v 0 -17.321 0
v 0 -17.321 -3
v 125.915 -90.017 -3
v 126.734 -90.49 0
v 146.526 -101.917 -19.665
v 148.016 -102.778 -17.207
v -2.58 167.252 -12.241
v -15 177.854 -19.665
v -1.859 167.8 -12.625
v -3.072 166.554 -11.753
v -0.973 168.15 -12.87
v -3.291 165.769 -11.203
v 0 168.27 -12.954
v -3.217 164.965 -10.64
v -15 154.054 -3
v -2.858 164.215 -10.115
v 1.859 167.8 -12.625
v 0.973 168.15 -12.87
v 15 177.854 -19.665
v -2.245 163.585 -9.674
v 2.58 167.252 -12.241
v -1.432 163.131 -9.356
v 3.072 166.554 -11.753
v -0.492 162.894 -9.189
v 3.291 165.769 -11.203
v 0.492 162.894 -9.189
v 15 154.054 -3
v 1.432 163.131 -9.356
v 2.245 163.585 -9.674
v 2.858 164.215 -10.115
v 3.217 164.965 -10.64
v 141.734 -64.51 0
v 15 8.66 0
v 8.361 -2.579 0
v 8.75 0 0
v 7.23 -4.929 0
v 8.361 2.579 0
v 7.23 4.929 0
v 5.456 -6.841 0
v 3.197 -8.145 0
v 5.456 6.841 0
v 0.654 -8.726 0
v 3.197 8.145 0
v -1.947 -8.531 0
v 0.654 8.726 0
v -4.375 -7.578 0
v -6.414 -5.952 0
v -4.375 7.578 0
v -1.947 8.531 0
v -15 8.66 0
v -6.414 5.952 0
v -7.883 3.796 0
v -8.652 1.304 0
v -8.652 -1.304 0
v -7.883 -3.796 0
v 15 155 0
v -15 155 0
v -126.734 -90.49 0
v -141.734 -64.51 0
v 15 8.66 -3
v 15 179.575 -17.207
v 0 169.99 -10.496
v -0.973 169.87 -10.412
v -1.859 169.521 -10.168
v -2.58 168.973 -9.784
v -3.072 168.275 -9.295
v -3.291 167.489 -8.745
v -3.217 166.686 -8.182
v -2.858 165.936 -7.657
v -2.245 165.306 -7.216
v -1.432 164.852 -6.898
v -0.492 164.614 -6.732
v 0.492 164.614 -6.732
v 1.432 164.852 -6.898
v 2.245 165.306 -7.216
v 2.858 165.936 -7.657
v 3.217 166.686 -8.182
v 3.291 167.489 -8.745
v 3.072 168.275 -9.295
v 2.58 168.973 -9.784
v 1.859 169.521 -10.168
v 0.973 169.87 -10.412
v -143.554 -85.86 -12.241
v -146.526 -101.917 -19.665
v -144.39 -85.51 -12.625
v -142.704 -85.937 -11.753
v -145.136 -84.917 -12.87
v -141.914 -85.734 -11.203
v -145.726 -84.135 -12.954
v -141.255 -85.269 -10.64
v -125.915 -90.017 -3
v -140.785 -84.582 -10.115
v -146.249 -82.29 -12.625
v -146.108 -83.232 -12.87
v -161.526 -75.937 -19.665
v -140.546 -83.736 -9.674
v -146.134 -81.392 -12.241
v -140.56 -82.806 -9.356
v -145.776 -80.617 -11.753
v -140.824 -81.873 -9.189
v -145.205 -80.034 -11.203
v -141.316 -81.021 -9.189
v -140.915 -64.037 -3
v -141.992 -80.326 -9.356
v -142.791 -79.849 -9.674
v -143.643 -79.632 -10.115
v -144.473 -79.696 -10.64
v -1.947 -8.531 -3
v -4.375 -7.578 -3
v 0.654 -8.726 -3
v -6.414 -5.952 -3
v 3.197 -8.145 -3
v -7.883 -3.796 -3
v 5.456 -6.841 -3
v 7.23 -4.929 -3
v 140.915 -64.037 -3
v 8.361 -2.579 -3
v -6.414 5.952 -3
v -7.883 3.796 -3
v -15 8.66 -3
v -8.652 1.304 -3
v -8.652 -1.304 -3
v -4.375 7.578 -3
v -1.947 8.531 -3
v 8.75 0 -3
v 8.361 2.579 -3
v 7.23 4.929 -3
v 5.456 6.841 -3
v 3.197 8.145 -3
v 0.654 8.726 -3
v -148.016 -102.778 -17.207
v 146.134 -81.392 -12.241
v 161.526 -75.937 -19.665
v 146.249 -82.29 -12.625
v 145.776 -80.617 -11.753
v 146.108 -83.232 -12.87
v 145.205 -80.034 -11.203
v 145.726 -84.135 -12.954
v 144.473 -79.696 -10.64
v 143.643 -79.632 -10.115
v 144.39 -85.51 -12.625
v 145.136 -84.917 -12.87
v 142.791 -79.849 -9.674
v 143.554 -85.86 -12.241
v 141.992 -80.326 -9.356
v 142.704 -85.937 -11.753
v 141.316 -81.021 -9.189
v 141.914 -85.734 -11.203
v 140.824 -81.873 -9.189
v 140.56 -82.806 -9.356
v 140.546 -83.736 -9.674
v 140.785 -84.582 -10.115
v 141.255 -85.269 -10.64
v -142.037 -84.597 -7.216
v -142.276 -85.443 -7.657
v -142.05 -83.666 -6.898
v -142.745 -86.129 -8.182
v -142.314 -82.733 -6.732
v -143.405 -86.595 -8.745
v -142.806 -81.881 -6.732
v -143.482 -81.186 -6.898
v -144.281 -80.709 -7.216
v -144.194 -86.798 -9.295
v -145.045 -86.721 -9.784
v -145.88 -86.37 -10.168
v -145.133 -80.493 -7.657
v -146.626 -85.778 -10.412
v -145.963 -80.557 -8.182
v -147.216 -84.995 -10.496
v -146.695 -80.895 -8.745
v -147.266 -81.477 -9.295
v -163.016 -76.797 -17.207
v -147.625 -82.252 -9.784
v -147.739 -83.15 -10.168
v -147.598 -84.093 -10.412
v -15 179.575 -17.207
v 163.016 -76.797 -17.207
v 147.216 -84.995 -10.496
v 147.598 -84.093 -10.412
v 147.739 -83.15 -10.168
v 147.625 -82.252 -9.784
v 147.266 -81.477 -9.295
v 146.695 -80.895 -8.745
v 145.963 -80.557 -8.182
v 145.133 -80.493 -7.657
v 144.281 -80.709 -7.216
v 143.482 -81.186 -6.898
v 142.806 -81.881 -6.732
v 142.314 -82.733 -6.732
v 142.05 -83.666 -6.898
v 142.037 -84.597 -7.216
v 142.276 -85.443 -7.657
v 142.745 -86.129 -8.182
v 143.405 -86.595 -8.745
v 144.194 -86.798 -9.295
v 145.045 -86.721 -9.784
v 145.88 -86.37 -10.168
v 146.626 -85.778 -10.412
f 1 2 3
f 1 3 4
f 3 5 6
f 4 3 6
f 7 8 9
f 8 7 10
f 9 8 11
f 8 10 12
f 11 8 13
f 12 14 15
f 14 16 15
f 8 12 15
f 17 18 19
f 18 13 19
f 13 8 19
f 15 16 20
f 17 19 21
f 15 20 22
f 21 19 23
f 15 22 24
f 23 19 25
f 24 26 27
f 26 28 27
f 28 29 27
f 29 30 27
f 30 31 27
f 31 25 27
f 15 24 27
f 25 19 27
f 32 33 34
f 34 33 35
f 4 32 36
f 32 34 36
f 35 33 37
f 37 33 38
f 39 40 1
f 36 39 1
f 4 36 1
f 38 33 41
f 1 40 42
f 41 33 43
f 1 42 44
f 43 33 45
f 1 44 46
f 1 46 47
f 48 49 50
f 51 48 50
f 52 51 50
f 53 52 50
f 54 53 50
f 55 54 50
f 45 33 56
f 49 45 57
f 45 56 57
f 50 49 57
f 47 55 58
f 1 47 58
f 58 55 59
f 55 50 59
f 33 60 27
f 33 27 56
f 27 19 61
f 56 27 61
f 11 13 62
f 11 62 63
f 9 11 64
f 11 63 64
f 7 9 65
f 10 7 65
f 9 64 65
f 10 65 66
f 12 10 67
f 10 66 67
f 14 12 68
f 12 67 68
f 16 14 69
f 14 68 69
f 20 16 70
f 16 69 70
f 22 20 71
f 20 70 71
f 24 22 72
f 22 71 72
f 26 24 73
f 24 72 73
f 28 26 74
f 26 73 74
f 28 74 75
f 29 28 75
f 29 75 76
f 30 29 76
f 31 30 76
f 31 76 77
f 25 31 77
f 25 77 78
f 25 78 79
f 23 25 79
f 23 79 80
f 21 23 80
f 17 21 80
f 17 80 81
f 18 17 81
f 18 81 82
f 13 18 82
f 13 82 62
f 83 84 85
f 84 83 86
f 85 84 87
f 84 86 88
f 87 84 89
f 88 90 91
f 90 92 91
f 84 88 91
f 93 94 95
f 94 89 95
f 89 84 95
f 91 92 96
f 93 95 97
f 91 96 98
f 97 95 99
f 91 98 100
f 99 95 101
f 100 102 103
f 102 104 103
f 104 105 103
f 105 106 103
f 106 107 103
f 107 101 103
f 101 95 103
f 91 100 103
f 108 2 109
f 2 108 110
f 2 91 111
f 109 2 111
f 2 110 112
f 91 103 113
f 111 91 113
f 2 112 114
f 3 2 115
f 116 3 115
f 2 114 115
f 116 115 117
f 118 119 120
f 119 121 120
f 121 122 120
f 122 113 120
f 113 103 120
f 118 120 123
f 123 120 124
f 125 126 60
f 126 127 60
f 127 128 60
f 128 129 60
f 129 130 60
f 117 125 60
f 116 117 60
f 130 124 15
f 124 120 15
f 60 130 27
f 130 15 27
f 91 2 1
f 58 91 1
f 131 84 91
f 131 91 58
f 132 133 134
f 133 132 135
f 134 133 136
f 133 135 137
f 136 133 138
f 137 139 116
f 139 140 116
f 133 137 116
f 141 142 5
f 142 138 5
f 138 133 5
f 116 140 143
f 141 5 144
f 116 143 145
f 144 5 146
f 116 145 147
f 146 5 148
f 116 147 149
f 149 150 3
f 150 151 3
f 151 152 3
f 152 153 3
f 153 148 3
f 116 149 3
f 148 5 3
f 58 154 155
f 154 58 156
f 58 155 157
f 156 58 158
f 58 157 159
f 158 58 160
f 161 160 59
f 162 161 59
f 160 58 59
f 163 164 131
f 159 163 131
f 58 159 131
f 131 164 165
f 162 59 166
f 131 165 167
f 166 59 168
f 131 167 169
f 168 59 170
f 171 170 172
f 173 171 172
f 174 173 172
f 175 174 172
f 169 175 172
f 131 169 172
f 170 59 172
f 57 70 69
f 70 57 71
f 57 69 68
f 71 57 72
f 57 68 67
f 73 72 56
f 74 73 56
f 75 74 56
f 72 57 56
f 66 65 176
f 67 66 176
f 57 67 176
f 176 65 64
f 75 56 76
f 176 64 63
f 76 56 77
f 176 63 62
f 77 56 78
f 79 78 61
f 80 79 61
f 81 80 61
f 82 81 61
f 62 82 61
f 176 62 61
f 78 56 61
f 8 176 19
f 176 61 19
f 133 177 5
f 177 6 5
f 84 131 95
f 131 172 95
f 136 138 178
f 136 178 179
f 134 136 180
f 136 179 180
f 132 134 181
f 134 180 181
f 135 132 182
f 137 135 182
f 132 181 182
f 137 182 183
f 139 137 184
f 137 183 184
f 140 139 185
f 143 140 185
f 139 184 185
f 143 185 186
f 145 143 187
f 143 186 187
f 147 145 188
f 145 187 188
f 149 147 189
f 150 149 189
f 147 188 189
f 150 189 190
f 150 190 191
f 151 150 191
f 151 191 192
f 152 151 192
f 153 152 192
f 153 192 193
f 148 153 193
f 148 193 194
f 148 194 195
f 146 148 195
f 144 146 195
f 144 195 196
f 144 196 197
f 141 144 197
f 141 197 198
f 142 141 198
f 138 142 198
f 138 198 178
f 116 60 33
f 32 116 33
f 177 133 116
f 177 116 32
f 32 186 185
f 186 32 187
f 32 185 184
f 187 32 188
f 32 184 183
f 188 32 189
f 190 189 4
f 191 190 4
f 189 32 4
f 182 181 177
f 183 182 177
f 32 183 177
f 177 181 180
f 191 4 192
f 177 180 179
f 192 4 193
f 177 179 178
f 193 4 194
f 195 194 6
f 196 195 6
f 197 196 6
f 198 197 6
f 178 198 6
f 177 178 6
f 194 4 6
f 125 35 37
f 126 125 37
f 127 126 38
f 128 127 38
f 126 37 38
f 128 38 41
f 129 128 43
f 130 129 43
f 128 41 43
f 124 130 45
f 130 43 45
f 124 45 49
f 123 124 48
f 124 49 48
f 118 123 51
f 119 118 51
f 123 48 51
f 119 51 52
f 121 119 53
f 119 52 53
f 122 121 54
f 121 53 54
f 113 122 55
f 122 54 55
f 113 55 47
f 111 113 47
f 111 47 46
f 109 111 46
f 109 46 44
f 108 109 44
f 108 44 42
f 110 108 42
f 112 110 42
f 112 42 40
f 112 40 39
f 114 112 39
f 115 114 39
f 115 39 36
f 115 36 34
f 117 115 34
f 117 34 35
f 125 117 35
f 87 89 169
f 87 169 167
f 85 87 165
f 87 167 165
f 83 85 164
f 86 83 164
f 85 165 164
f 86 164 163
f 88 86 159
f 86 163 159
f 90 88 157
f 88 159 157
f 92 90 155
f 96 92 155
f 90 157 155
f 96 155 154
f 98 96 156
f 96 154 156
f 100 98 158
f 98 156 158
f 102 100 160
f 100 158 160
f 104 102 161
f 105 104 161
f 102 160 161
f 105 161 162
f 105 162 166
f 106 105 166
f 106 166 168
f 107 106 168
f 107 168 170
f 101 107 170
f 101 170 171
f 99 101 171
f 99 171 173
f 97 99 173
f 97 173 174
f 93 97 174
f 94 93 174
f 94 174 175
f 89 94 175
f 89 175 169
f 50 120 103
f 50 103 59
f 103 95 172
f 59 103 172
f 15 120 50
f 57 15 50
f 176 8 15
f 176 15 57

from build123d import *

# Parameters (mm, degrees)
EXTRUDE_1_DEPTH          = 15
PATTERN_CIRCULAR_1_COUNT = 3
HOLE_WIZARD_M161_D       = 17.5
HOLE_WIZARD_M62_D        = 6.6
PATTERN_CIRCULAR_2_COUNT = 3


with BuildPart() as part:
    # Эскиз1 → Вытянуть-Тонкостенный1 (new, symmetric)
    with BuildSketch(Plane(origin=(0, 0, 0), x_dir=(0, 0, -1), z_dir=(1, 0, 0))):
        Polygon((0, 0), (0, 155), (17.207293091, 179.574561329), (19.664749223, 177.85383202), (3, 154.054103633), (3, 0), align=None)
    extrude_1 = extrude(amount=EXTRUDE_1_DEPTH, both=True)

    # Круговой массив1: Вытянуть-Тонкостенный1 ×3 about axis
    pattern_circular_1_axis = Axis((0, 0, 0), (0, 0, -1))
    for i in range(1, PATTERN_CIRCULAR_1_COUNT):
        add(extrude_1.rotate(pattern_circular_1_axis, i * 360 / PATTERN_CIRCULAR_1_COUNT))

    # Отверстие с зазором M161 (through all)
    with Locations(Plane(origin=(0, 0, -3), x_dir=(-1, 0, 0), z_dir=(0, 0, -1))):
        with Locations((0, 0)):
            Hole(HOLE_WIZARD_M161_D / 2)

    # Отверстие с зазором M62 (through all)
    with Locations(Plane(origin=(0, 165.566551355, -11.061102678), x_dir=(0, -0.819152044289, 0.573576436351), z_dir=(0, -0.573576436351, -0.819152044289))):
        with Locations((0, 0)):
            hole_wizard_m62 = Hole(HOLE_WIZARD_M62_D / 2)

    # Круговой массив2: Отверстие с зазором M62 ×3 about axis
    pattern_circular_2_axis = Axis((0, 0, 0), (0, 0, -1))
    for i in range(1, PATTERN_CIRCULAR_2_COUNT):
        add(hole_wizard_m62.rotate(pattern_circular_2_axis, i * 360 / PATTERN_CIRCULAR_2_COUNT), mode=Mode.SUBTRACT)


solid = part.part
